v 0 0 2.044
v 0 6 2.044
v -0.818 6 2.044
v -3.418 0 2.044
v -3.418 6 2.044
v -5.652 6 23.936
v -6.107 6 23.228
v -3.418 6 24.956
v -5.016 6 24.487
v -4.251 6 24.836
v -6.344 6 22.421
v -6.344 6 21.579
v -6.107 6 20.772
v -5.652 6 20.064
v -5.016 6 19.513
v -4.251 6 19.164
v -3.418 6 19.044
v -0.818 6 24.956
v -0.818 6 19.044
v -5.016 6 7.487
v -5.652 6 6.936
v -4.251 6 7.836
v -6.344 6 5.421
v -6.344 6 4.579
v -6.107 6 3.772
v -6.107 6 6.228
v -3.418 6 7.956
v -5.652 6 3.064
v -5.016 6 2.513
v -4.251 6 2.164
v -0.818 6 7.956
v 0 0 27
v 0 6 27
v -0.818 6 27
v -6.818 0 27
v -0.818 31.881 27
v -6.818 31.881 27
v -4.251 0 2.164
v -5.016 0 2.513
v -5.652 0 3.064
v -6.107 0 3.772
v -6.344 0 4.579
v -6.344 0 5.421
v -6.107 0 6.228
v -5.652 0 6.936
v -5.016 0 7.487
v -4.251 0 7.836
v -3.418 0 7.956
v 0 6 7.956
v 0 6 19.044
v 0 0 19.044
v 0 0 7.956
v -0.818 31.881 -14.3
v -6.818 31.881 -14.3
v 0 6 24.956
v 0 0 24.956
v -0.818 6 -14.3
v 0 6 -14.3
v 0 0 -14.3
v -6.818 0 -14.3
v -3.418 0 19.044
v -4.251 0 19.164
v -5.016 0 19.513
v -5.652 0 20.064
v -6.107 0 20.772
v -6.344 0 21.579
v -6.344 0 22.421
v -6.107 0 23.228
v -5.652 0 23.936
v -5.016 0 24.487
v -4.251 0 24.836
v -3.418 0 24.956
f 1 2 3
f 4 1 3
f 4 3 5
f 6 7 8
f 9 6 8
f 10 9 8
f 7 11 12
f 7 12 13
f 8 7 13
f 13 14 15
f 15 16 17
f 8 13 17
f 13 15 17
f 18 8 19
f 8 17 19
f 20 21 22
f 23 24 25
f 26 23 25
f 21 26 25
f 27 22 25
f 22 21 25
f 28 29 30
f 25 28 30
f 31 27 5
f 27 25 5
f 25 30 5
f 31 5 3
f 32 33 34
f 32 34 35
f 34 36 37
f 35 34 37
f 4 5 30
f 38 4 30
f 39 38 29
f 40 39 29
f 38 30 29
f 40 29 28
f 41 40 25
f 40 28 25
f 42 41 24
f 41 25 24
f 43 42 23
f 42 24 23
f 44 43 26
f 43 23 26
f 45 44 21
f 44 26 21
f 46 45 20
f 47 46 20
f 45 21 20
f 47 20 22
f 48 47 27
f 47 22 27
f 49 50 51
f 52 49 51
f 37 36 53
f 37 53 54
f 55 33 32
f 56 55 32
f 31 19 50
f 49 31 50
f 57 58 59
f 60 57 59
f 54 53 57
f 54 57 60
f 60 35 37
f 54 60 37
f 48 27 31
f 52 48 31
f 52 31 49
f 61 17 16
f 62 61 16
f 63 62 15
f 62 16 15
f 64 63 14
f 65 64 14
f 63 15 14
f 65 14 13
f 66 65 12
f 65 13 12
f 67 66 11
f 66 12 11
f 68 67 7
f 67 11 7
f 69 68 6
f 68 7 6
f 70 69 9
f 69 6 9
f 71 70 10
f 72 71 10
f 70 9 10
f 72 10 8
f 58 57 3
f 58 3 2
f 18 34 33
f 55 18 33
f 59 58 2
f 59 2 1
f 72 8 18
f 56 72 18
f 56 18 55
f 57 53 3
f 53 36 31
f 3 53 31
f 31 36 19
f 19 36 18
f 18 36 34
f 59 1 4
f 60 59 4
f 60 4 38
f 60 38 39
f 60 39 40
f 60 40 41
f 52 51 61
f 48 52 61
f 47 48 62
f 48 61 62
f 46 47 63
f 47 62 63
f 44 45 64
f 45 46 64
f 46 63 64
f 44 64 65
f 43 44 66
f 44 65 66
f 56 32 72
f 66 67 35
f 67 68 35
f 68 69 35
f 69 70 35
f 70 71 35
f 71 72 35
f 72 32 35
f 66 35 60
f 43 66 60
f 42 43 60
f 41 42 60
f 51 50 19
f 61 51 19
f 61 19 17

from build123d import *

# Parameters (mm, degrees)
BOSS_EXTRUDE1_DEPTH = 27
BOSS_EXTRUDE2_DEPTH = 14.3
CUT_EXTRUDE1_DEPTH  = 6
SKETCH4_W           = 6
SKETCH4_H           = 44.518768508
CUT_EXTRUDE2_DEPTH  = 66


with BuildPart() as part:
    # Sketch1 → Boss-Extrude1 (new body)
    with BuildSketch(Plane.XY):
        Polygon((0, 0), (-6.81828161, 0), (-6.81828161, 76.4), (-0.81828161, 76.4), (-0.81828161, 6), (0, 6), align=None)
    extrude(amount=BOSS_EXTRUDE1_DEPTH)

    # Sketch2 → Boss-Extrude2 (add)
    with BuildSketch(Plane(origin=(0, 0, 0), x_dir=(-1, 0, 0), z_dir=(0, 0, -1))):
        Polygon((0.81828161, 6), (0, 6), (0, 0), (6.81828161, 0), (6.81828161, 76.4), (0.81828161, 76.4), align=None)
    extrude(amount=BOSS_EXTRUDE2_DEPTH)

    # Sketch3 → Cut-Extrude1 (cut)
    with BuildSketch(Plane(origin=(0, 6, 0), x_dir=(1, 0, 0), z_dir=(0, 1, 0))):
        with BuildLine():
            Line((8.68171839, -2.04396728), (-3.41828161, -2.04396728))
            ThreePointArc((-3.41828161, -2.04396728), (-6.37431433, -5), (-3.41828161, -7.95603272))
            Line((-3.41828161, -7.95603272), (8.68171839, -7.95603272))
            ThreePointArc((8.68171839, -7.95603272), (11.63775111, -5), (8.68171839, -2.04396728))
        make_face()
        with BuildLine():
            Line((8.68171839, -19.04396728), (-3.41828161, -19.04396728))
            ThreePointArc((-3.41828161, -19.04396728), (-6.37431433, -22), (-3.41828161, -24.95603272))
            Line((-3.41828161, -24.95603272), (8.68171839, -24.95603272))
            ThreePointArc((8.68171839, -24.95603272), (11.63775111, -22), (8.68171839, -19.04396728))
        make_face()
    extrude(amount=-CUT_EXTRUDE1_DEPTH, mode=Mode.SUBTRACT)

    # Sketch4 → Cut-Extrude2 (cut)
    with BuildSketch(Plane(origin=(0, 0, -14.3), x_dir=(-1, 0, 0), z_dir=(0, 0, -1))):
        with Locations((3.81828161, 54.140615746)):
            Rectangle(SKETCH4_W, SKETCH4_H)
    extrude(amount=-CUT_EXTRUDE2_DEPTH, mode=Mode.SUBTRACT)


solid = part.part
